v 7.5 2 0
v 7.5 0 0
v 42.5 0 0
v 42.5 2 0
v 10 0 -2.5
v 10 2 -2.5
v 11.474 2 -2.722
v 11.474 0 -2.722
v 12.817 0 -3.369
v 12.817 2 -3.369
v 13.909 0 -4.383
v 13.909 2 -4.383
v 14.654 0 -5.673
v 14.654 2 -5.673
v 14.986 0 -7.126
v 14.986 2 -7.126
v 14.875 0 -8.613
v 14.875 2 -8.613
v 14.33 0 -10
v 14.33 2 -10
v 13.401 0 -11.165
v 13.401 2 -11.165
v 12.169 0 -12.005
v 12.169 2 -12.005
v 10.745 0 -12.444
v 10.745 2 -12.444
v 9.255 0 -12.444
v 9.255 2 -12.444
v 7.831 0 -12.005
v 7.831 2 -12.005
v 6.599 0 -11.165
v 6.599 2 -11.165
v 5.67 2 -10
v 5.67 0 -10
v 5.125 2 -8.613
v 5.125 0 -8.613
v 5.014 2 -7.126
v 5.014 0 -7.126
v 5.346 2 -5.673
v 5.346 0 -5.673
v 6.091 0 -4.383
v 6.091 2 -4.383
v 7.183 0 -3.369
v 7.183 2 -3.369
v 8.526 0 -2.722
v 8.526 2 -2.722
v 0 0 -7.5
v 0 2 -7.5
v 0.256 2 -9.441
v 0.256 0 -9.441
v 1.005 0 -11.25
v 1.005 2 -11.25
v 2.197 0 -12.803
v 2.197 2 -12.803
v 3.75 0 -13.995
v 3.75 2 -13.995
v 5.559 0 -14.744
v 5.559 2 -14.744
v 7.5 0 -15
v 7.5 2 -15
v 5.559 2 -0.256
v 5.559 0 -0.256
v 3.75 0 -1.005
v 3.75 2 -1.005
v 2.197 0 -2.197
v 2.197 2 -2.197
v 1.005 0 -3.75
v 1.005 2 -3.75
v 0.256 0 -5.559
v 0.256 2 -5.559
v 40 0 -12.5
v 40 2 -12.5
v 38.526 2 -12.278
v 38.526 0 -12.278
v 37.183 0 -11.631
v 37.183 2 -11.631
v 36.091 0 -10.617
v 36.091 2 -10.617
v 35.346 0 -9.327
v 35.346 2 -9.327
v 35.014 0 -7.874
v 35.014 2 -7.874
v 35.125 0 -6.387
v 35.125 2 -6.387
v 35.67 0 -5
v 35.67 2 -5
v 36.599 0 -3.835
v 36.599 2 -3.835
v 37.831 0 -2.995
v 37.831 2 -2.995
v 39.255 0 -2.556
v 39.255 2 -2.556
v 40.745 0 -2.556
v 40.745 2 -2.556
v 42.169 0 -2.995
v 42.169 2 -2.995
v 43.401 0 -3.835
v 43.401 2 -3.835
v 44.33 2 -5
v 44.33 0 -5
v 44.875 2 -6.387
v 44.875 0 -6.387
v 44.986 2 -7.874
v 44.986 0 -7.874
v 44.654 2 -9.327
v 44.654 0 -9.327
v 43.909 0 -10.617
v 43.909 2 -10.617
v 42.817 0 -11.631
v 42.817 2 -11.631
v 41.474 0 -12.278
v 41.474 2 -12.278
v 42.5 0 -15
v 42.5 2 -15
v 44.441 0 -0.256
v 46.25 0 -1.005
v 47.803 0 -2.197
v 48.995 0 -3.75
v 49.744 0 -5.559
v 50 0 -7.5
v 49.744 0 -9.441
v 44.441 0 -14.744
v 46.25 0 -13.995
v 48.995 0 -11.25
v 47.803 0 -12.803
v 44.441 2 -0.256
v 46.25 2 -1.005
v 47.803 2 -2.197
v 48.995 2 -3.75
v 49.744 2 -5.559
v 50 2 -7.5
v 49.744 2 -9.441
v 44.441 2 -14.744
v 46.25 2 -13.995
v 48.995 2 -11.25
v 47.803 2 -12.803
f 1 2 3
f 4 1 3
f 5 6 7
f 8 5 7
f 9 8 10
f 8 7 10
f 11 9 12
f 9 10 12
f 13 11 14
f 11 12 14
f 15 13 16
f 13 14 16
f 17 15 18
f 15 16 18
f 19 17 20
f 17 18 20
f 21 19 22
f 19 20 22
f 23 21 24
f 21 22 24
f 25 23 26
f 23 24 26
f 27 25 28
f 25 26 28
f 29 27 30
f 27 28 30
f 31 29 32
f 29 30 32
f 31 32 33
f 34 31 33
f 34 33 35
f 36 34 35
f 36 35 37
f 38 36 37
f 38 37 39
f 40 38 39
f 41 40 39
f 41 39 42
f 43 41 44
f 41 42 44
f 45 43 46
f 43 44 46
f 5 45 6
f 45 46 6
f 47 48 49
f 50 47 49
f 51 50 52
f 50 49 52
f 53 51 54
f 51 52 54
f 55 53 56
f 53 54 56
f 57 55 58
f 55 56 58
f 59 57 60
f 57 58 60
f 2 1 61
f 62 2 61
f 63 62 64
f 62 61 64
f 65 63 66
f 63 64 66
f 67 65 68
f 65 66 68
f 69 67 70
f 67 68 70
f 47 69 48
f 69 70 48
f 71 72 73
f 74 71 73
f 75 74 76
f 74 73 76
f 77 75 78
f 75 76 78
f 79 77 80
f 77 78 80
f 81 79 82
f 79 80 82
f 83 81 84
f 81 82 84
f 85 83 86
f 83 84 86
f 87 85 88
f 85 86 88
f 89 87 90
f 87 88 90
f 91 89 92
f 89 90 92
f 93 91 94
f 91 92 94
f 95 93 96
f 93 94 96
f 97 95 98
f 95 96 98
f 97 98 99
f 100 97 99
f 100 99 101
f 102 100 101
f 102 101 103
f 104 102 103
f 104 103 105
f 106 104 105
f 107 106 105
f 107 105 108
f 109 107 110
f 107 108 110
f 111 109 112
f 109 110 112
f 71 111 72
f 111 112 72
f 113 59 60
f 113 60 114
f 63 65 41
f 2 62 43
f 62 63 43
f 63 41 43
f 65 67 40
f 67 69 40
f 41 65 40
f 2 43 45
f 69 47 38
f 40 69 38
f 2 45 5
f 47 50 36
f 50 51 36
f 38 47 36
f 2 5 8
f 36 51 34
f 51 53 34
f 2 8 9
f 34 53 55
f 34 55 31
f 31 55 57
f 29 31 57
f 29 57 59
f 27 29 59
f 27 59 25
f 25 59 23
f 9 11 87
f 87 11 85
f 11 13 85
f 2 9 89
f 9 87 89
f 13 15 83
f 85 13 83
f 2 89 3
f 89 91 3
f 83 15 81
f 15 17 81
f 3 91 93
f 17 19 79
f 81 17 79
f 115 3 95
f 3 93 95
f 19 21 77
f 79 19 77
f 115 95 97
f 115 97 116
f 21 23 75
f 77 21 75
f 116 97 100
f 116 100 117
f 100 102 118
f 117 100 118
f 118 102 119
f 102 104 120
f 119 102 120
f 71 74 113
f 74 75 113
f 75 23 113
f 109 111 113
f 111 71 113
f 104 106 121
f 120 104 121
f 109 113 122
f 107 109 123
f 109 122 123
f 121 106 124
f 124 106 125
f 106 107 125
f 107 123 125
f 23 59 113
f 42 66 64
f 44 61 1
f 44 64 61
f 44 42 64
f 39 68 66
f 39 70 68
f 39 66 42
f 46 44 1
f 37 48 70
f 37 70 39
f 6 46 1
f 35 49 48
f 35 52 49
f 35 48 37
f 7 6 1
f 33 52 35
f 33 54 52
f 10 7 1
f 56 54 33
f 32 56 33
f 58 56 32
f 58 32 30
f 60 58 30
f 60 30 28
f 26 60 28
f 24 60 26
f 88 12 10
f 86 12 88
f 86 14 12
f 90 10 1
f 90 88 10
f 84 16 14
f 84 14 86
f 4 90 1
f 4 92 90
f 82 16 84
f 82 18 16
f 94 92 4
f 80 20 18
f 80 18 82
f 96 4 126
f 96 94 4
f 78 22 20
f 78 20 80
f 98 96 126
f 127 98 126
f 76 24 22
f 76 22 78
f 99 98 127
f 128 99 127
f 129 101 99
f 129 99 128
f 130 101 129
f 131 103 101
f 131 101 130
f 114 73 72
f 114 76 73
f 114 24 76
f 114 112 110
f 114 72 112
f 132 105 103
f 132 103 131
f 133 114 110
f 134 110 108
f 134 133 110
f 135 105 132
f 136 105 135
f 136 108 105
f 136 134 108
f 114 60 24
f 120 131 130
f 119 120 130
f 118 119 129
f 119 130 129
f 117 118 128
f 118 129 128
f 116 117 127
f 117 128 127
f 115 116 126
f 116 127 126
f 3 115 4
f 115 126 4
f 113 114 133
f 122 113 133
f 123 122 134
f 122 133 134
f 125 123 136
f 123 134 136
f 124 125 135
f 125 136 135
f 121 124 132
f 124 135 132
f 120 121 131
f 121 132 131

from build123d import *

# Parameters (mm, degrees)
SKETCH1_W           = 50
SKETCH1_H           = 15
BOSS_EXTRUDE1_DEPTH = 2
SKETCH2_R           = 5
CUT_EXTRUDE1_DEPTH  = 2
CUT_EXTRUDE2_DEPTH  = 2


with BuildPart() as part:
    # Sketch1 → Boss-Extrude1 (new body)
    with BuildSketch(Plane(origin=(0, 0, 0), x_dir=(1, 0, 0), z_dir=(0, 1, 0))):
        with Locations((25, 7.5)):
            Rectangle(SKETCH1_W, SKETCH1_H)
    extrude(amount=BOSS_EXTRUDE1_DEPTH)

    # Sketch2 → Cut-Extrude1 (cut)
    with BuildSketch(Plane(origin=(0, 2, 0), x_dir=(1, 0, 0), z_dir=(0, 1, 0))):
        with Locations(Location((10, 7.5, 0), (0, 0, 270))):
            Circle(SKETCH2_R)
        with Locations(Location((40, 7.5, 0), (0, 0, 90))):
            Circle(SKETCH2_R)
    extrude(amount=-CUT_EXTRUDE1_DEPTH, mode=Mode.SUBTRACT)

    # Sketch5 → Cut-Extrude2 (cut)
    with BuildSketch(Plane(origin=(0, 2, 0), x_dir=(1, 0, 0), z_dir=(0, 1, 0))):
        with BuildLine():
            ThreePointArc((0, 7.5), (2.196699141, 12.803300859), (7.5, 15))
            Line((7.5, 15), (0, 15))
            Line((0, 15), (0, 7.5))
        make_face()
        with BuildLine():
            ThreePointArc((7.5, 0), (2.196699141, 2.196699141), (0, 7.5))
            Line((0, 7.5), (0, 0))
            Line((0, 0), (7.5, 0))
        make_face()
        with BuildLine():
            Line((50, 15), (42.5, 15))
            ThreePointArc((42.5, 15), (47.803300859, 12.803300859), (50, 7.5))
            Line((50, 7.5), (50, 15))
        make_face()
        with BuildLine():
            Line((50, 0), (50, 7.5))
            ThreePointArc((50, 7.5), (47.803300859, 2.196699141), (42.5, 0))
            Line((42.5, 0), (50, 0))
        make_face()
    extrude(amount=-CUT_EXTRUDE2_DEPTH, mode=Mode.SUBTRACT)


solid = part.part
